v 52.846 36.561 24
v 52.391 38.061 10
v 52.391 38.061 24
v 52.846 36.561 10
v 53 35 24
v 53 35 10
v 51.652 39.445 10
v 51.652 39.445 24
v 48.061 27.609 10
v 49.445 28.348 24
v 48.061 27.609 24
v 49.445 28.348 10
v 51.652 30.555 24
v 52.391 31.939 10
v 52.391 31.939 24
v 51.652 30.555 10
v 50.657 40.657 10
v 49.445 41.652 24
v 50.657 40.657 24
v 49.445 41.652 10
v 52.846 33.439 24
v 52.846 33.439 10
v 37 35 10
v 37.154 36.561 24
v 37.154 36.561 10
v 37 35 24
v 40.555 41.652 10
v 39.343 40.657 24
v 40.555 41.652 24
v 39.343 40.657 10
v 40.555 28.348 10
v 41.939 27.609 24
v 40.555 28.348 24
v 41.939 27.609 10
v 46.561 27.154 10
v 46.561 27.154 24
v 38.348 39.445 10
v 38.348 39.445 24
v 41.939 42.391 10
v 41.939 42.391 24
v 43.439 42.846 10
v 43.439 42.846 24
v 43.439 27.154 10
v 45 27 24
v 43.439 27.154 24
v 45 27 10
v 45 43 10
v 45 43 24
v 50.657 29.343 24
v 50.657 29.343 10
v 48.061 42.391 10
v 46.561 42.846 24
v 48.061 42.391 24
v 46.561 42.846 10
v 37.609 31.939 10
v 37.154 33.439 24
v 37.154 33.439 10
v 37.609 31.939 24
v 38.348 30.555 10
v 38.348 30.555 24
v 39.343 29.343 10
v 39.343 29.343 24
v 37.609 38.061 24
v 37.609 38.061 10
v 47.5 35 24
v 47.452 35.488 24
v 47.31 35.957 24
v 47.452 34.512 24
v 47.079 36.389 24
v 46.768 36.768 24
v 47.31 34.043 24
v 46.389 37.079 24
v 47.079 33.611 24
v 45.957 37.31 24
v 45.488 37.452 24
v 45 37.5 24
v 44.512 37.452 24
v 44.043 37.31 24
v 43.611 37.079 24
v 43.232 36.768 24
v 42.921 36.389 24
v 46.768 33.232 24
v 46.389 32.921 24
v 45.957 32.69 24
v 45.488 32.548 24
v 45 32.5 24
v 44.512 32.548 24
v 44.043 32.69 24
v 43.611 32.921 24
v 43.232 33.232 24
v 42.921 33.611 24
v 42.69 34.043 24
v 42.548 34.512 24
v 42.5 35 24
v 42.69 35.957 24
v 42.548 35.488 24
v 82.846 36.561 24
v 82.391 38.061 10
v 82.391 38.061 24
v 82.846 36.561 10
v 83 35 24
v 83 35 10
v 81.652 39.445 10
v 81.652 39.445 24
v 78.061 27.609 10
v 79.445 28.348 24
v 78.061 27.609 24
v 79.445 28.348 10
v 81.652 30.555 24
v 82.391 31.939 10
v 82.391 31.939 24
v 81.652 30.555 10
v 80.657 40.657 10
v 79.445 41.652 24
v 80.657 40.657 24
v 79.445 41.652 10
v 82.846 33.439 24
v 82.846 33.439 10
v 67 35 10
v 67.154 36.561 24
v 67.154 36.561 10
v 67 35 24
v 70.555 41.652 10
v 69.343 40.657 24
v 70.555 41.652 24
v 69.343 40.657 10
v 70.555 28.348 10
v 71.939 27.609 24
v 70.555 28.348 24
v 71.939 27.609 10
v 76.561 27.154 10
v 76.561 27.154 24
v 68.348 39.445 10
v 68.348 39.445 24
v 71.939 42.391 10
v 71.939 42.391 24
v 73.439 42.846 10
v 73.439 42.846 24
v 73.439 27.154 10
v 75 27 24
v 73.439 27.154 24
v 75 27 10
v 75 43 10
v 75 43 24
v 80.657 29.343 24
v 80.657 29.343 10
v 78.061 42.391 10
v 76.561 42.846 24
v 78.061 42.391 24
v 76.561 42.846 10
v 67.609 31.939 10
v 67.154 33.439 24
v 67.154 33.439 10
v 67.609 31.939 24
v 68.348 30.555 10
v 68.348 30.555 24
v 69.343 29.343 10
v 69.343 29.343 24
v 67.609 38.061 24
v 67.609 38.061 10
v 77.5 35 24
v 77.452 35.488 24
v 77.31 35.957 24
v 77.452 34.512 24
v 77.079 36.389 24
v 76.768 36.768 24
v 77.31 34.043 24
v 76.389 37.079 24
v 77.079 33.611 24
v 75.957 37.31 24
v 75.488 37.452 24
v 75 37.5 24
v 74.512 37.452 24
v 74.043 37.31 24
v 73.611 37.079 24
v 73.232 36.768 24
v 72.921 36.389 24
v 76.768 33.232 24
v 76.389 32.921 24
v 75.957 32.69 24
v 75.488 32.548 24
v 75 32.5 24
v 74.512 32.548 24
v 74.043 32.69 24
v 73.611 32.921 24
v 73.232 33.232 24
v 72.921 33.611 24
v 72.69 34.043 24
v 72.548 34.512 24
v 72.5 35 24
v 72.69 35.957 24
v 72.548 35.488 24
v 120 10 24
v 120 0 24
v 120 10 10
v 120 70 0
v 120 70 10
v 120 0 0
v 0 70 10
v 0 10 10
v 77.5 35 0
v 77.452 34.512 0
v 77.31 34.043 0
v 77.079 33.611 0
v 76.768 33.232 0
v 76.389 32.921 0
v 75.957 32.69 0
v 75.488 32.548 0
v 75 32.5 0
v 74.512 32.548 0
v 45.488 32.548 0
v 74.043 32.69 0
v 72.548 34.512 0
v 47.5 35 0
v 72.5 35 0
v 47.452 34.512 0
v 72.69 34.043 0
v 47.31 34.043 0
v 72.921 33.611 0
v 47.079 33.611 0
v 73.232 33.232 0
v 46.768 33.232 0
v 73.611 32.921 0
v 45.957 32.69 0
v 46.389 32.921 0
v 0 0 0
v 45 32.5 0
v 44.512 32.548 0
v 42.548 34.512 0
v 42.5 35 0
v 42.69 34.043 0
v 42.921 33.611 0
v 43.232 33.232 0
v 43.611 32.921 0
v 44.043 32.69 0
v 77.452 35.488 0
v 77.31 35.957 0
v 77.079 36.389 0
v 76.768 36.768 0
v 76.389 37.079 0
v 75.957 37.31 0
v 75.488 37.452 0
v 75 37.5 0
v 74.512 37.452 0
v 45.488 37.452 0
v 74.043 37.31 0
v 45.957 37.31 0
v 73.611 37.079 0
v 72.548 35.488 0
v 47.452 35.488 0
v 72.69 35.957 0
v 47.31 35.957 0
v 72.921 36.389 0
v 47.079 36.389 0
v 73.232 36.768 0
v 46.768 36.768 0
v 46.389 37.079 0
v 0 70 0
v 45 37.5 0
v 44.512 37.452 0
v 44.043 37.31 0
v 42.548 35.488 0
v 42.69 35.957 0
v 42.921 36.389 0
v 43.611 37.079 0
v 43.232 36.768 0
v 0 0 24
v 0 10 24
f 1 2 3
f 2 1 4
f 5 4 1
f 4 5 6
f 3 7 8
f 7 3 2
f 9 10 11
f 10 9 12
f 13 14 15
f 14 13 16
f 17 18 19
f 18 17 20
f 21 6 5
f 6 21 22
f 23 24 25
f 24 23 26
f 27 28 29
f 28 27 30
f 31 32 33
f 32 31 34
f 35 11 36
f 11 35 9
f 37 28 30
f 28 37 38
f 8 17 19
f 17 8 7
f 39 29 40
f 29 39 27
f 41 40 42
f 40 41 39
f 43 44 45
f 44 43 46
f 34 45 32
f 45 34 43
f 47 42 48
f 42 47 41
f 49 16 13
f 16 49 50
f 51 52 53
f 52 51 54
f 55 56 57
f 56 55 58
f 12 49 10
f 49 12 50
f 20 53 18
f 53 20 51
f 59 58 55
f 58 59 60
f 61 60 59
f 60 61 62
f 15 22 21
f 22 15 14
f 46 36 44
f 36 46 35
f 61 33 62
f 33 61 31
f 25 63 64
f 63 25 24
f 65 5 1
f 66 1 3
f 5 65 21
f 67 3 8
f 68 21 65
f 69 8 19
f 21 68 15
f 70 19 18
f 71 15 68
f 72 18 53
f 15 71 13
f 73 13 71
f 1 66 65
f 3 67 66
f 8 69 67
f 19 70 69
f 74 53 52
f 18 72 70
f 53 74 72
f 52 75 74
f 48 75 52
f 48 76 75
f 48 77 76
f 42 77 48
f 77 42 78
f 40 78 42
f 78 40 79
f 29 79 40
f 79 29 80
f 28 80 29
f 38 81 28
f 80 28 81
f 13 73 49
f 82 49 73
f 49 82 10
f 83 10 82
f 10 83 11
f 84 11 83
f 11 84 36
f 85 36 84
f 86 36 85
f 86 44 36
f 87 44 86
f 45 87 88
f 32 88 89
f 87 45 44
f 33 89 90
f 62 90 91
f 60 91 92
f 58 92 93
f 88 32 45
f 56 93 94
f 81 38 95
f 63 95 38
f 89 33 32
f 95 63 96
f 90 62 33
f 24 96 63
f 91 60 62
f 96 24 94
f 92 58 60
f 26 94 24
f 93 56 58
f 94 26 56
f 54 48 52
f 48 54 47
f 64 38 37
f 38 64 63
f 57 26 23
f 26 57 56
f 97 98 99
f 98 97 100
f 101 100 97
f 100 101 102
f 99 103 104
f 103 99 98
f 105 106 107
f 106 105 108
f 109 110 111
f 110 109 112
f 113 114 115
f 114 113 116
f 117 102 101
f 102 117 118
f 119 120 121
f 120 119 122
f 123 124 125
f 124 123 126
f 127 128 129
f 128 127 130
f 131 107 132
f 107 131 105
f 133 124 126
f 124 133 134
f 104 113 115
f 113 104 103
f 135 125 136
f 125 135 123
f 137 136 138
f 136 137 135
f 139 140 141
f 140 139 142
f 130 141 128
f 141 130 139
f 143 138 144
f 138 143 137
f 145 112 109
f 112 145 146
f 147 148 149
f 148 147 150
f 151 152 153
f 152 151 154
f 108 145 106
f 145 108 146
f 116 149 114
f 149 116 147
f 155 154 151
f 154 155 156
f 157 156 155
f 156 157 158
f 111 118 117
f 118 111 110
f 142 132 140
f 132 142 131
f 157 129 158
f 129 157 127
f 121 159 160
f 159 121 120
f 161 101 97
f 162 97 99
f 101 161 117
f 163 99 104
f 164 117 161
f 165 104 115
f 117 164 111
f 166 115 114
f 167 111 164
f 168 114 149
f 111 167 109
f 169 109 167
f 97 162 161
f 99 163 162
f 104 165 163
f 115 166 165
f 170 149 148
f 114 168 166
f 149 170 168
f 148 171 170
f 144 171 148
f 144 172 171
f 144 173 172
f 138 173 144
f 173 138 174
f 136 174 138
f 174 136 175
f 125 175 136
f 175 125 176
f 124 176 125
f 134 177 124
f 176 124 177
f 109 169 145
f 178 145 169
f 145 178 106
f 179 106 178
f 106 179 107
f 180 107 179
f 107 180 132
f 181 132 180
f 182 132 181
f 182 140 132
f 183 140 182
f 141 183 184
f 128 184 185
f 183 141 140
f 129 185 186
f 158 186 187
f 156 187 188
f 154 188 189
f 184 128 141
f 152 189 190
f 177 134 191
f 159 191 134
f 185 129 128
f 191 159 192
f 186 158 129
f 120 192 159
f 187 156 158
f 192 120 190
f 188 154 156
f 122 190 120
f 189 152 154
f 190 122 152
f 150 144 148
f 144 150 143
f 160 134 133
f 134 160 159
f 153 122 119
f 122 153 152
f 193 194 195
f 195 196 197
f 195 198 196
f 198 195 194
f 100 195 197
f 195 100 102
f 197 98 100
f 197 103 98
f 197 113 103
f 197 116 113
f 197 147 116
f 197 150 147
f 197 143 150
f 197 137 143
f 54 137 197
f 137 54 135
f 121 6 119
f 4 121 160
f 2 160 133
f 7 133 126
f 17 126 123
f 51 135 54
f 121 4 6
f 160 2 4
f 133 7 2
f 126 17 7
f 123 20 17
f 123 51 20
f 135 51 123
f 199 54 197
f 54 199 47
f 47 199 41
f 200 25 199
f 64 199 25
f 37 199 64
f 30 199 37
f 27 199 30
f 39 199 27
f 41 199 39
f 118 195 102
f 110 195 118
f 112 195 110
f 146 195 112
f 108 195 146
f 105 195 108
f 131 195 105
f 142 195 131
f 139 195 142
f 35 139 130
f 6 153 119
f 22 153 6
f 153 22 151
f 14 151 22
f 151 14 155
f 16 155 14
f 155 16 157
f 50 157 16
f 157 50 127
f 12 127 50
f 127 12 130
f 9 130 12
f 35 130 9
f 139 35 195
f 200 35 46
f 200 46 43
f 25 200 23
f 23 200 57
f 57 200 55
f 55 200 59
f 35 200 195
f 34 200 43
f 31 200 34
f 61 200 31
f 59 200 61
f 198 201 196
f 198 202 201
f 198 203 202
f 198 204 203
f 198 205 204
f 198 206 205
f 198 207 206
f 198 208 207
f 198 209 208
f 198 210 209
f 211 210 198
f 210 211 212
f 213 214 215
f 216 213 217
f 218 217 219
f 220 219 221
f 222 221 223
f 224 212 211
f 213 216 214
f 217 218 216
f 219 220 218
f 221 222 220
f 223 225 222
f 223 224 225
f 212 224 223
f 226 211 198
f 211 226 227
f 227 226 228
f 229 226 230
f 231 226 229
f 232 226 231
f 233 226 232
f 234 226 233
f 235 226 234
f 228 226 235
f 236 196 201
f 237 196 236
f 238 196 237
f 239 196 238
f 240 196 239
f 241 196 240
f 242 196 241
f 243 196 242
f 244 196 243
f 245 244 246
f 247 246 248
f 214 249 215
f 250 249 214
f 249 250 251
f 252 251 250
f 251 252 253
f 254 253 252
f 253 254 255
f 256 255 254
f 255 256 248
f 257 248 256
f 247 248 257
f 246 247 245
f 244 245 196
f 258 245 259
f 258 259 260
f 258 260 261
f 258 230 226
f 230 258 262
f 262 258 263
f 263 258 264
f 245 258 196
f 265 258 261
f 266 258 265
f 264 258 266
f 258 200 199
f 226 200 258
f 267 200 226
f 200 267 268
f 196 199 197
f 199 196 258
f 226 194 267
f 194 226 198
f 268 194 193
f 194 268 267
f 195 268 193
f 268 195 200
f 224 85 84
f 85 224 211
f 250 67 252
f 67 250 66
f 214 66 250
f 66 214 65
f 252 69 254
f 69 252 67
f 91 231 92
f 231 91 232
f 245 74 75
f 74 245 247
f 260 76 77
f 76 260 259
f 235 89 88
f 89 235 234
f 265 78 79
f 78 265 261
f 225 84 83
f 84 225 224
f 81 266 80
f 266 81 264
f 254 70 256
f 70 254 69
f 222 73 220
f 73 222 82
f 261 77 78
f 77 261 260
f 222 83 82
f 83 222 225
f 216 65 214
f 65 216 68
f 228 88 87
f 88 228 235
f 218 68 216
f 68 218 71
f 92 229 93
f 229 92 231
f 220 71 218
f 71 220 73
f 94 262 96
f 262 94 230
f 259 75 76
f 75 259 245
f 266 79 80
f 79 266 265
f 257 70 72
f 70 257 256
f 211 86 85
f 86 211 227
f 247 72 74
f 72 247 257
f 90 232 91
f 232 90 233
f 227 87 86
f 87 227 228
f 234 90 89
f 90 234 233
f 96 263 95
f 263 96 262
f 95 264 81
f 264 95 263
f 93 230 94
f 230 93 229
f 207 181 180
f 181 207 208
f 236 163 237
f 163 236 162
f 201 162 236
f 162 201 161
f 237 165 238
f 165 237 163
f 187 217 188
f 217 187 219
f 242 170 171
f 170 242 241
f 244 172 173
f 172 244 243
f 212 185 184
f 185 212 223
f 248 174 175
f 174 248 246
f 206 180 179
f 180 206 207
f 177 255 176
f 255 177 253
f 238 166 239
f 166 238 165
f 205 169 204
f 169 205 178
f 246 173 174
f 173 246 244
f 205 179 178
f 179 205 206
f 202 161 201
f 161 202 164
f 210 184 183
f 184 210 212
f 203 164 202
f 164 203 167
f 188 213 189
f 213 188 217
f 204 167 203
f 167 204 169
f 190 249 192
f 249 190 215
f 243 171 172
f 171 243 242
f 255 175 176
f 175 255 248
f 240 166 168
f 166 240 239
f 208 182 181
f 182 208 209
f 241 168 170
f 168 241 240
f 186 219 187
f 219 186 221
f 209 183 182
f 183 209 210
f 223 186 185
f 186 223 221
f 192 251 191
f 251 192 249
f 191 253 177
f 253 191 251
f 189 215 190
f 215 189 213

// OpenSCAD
$fn = 32;

// ----------------------------------------------------------------------
// Drill jig: fence jig
// ----------------------------------------------------------------------

// --- parameters (mm) ---
plate_l = 120;            // plate length, X
plate_w = 70;             // plate width, Y
plate_t = 10;             // plate thickness
boss_d = 16;              // guide boss diameter
boss_h = 15;              // boss height above the plate
guide_d = 5;              // guide hole diameter
boss_pitch = 30;          // boss pitch
fence_h = 15;             // fence height above the plate
fence_t = 10;             // fence thickness

n_boss = 2;  // guide bosses
boss_x0 = (plate_l - (n_boss - 1) * boss_pitch) / 2;  // first boss X
boss_top = plate_t - 1 + boss_h;  // boss crown height
fence_top = plate_t - 1 + fence_h;  // fence crown height
total_h = max([fence_top, boss_top]);  // overall height

difference() {
  union() {
  cube([plate_l, plate_w, plate_t]);
  for (i = [0 : n_boss - 1])
    translate([boss_x0 + i * boss_pitch, plate_w / 2, plate_t - 1])
      cylinder(h = boss_h, d = boss_d);
  translate([0, 0, plate_t - 1]) cube([plate_l, fence_t, fence_h]);
  }
  for (i = [0 : n_boss - 1])
    translate([boss_x0 + i * boss_pitch, plate_w / 2, -1])
      cylinder(h = plate_t + boss_h, d = guide_d);
}
